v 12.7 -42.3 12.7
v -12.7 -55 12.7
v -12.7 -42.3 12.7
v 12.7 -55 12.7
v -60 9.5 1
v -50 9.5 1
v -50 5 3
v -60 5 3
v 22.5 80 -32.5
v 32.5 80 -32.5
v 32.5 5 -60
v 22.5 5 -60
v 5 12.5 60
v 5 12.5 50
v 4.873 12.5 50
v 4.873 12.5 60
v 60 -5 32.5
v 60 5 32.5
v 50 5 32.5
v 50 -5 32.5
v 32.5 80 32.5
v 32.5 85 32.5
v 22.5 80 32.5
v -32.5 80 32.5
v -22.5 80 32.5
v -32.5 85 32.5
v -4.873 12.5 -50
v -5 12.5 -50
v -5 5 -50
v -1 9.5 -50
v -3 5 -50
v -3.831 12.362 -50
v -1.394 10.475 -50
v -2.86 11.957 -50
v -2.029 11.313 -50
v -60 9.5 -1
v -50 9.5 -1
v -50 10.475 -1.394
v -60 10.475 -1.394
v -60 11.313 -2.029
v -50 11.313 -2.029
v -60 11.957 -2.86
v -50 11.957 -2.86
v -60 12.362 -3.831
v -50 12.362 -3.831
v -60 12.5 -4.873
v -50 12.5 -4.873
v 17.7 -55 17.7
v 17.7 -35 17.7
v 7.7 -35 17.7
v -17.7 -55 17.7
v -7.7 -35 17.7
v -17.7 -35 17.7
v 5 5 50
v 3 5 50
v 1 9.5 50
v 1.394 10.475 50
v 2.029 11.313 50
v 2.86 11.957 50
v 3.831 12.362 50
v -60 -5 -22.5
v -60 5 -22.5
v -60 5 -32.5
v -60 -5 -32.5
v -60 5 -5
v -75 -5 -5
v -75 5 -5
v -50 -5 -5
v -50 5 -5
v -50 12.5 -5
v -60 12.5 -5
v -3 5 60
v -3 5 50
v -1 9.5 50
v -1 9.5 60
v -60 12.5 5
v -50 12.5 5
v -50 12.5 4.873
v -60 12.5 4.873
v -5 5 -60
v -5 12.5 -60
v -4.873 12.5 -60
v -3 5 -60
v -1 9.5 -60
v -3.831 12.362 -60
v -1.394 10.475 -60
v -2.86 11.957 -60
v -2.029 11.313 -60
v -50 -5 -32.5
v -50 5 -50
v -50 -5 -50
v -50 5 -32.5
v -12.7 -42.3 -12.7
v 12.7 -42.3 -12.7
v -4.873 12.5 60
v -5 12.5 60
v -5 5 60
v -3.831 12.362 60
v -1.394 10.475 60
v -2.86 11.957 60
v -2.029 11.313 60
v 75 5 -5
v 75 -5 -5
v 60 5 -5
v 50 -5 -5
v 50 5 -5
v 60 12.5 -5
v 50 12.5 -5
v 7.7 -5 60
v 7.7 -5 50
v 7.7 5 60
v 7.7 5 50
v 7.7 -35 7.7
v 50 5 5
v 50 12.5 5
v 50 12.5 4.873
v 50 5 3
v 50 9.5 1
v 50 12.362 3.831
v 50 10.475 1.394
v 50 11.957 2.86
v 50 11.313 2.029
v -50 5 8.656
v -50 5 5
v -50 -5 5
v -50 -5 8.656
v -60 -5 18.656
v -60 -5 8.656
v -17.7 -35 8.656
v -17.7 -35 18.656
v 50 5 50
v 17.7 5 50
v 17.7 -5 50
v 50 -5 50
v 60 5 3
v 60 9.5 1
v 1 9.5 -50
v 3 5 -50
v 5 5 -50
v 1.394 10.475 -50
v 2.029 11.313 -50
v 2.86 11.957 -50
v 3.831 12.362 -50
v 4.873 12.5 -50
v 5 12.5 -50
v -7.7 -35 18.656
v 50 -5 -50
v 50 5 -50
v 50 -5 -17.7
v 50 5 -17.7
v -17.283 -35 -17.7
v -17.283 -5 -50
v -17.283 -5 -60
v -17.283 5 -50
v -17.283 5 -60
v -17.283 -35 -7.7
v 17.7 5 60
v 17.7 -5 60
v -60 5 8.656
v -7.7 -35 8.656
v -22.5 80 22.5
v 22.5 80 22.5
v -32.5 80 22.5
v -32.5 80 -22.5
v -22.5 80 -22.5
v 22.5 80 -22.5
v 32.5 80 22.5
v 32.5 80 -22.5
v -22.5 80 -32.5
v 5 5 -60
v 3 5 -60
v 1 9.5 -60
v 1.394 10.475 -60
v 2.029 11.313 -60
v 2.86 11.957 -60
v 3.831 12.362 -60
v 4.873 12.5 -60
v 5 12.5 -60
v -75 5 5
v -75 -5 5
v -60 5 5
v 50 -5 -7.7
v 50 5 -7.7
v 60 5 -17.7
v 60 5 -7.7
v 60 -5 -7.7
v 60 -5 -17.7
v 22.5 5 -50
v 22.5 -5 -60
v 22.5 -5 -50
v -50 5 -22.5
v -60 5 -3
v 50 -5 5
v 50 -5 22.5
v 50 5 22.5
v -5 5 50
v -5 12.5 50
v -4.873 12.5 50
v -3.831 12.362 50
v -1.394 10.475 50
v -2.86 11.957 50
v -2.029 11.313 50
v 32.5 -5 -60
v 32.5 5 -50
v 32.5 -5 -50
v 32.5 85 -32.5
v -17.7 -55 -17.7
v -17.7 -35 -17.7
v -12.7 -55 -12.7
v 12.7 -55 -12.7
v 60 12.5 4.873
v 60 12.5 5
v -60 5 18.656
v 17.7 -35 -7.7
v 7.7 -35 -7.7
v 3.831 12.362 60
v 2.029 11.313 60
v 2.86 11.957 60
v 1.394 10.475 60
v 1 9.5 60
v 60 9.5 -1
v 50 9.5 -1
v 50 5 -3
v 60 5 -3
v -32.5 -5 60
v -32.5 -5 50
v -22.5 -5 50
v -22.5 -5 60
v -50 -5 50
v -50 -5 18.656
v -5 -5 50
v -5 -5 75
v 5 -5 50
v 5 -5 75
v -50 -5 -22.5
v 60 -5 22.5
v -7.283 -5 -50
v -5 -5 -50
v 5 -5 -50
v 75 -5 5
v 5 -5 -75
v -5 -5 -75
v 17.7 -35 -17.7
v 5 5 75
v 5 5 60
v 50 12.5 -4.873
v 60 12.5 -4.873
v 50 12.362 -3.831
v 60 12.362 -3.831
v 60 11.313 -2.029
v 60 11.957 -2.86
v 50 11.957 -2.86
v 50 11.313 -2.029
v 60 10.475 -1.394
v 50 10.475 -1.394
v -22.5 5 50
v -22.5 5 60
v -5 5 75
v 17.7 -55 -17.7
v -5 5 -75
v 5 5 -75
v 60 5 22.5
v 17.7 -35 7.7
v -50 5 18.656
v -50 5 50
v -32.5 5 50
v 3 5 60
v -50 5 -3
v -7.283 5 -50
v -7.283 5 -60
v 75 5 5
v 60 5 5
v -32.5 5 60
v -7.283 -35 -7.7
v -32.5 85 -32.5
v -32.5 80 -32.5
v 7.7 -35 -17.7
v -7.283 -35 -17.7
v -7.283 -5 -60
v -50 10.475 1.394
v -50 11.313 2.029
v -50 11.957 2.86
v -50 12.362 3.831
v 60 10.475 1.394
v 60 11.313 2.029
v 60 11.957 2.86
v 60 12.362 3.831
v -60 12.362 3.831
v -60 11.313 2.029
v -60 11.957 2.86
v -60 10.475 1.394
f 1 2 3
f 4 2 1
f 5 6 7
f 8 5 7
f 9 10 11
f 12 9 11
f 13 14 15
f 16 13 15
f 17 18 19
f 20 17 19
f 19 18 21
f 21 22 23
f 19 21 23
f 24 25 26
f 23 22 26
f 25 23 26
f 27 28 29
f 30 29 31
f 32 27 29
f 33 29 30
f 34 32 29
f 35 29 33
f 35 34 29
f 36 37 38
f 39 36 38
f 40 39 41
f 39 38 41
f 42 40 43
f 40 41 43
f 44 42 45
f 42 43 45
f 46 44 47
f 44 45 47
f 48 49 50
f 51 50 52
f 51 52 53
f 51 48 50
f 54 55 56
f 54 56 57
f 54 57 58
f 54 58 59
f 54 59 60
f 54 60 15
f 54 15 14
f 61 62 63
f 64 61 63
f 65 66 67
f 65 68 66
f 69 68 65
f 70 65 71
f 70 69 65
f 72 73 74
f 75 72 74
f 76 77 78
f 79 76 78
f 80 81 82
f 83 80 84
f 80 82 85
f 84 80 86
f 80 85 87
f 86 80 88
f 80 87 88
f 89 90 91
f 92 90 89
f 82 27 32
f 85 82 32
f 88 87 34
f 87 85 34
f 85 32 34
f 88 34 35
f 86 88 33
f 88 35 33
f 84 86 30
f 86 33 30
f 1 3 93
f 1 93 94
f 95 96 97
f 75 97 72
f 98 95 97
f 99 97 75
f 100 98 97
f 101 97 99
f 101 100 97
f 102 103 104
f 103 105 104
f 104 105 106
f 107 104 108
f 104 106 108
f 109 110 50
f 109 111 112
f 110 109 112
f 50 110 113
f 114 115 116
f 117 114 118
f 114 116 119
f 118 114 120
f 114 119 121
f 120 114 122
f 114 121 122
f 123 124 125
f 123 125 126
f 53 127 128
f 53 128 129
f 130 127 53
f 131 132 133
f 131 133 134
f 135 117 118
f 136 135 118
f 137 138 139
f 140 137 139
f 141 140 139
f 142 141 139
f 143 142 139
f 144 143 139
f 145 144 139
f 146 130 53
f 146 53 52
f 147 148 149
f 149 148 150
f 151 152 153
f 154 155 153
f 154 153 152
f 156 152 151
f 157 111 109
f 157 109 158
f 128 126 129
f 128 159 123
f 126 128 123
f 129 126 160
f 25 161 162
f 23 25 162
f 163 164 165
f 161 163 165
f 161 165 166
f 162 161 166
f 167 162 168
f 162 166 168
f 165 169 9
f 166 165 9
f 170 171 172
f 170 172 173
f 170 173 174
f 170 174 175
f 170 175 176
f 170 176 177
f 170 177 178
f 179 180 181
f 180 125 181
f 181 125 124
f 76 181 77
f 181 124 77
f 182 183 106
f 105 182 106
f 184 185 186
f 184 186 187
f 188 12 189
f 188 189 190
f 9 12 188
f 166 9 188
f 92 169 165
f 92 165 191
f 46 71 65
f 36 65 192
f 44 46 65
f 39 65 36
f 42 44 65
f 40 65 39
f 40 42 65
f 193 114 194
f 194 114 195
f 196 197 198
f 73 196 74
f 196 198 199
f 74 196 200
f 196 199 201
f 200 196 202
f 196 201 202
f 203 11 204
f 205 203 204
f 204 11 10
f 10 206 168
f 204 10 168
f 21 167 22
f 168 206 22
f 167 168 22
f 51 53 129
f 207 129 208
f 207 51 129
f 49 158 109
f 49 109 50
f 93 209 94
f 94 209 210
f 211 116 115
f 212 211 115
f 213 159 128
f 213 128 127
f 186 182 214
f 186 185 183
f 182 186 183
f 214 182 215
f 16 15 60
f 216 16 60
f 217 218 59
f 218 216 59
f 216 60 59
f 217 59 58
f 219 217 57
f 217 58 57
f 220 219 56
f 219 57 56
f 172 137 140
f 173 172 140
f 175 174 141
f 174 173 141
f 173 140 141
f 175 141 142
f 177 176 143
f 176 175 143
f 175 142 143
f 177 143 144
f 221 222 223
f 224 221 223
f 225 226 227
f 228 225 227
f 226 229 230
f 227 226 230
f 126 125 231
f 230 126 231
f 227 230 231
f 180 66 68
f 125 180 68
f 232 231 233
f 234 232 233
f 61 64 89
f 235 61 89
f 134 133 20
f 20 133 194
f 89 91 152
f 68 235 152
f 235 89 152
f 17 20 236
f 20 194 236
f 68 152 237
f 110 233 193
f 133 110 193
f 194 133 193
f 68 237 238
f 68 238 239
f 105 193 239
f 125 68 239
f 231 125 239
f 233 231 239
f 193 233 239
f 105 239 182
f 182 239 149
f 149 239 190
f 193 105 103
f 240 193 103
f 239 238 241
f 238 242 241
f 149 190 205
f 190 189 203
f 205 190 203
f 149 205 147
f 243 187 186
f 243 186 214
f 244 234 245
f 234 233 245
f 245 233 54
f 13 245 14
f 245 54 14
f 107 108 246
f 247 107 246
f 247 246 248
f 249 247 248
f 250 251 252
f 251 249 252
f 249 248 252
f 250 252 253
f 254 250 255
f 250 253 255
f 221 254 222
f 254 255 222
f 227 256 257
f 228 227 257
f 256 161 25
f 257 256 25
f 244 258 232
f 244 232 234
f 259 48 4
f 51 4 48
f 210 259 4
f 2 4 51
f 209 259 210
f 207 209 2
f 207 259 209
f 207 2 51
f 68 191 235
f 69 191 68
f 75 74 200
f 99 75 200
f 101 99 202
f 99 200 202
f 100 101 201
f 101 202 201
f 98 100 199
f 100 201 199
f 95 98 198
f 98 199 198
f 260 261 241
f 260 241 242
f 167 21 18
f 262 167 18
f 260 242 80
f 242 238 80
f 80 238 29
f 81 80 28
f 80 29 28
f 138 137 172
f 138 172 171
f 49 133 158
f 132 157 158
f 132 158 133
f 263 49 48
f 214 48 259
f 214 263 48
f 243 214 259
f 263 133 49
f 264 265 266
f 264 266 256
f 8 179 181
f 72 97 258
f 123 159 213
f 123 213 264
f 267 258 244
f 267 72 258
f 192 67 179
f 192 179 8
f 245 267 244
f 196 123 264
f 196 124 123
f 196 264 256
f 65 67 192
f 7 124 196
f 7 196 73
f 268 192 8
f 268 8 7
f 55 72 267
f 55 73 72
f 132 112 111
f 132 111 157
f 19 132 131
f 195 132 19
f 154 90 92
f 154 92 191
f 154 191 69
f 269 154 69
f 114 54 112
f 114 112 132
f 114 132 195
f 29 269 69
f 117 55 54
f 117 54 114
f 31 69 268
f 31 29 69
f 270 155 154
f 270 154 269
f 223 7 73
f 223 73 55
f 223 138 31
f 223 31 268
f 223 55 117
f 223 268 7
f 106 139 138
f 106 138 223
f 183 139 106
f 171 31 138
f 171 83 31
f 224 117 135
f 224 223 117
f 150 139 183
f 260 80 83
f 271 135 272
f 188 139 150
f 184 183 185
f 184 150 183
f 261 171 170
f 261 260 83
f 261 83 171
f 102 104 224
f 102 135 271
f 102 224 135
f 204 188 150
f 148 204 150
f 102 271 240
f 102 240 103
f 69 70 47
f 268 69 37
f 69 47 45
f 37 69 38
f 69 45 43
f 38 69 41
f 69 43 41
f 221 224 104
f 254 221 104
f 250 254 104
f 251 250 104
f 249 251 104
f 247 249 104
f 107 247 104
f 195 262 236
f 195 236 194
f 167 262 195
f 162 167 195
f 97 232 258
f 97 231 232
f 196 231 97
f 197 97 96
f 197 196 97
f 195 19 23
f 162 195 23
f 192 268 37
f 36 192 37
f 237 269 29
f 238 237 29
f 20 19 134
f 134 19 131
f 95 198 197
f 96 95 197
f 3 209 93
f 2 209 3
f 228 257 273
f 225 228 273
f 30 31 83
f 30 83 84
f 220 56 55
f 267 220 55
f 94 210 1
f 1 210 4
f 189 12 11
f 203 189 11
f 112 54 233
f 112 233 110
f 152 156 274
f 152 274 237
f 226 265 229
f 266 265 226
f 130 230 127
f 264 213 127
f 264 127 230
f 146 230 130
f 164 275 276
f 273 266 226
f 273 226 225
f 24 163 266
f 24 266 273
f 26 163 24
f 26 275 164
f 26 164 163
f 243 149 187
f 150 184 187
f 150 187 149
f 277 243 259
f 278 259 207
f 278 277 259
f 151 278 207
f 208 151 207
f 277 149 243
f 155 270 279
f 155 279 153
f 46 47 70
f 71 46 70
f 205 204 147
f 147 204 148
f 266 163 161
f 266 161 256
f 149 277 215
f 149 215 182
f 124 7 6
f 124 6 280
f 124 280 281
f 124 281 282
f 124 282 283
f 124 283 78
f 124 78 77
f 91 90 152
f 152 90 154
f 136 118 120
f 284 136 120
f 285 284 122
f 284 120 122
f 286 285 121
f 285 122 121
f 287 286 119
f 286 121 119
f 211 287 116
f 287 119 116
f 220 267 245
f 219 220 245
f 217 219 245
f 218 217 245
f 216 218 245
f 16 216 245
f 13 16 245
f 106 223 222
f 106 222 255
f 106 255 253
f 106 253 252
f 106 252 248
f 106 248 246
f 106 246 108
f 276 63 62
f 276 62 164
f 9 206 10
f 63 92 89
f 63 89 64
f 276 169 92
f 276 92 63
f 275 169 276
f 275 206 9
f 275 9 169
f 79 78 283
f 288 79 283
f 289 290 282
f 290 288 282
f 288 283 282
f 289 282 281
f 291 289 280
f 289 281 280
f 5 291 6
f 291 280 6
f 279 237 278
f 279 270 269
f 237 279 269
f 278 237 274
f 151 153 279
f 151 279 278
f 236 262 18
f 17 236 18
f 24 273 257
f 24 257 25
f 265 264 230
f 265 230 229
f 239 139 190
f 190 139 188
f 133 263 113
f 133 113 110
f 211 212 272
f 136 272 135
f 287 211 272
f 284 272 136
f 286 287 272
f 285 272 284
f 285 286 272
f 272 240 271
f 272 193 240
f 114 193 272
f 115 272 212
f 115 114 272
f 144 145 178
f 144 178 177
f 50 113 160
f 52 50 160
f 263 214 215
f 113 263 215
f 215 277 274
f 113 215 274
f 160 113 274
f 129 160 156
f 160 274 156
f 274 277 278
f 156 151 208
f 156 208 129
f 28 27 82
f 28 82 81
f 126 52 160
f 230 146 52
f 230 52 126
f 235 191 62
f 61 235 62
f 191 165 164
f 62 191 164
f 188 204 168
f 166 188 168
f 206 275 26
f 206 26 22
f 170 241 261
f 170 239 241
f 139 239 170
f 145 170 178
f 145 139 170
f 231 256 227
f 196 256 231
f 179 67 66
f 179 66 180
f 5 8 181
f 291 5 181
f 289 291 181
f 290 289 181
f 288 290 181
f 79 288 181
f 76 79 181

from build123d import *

# Parameters (mm, degrees)
SKETCH2_W            = 100
SKETCH2_H            = 100
BOSS_EXTRUDE1_DEPTH  = 5
SKETCH3_W            = 100
SKETCH3_H            = 100
BOSS_EXTRUDE2_DEPTH  = 5
SKETCH8_R            = 5
BOSS_EXTRUDE7_DEPTH  = 30
BOSS_EXTRUDE21_DEPTH = 10
FILLET14_R           = 4
FILLET13_R           = 4
SKETCH24_W           = 10
SKETCH24_H           = 10
BOSS_EXTRUDE22_DEPTH = 15
BOSS_EXTRUDE25_DEPTH = 10
SKETCH26_W           = 10
SKETCH26_H           = 10
BOSS_EXTRUDE26_DEPTH = 15
FILLET18_R           = 4
FILLET17_R           = 4
BOSS_EXTRUDE23_DEPTH = 10
SKETCH25_W           = 10
SKETCH25_H           = 10
BOSS_EXTRUDE24_DEPTH = 15
FILLET15_R           = 4
FILLET16_R           = 4
BOSS_EXTRUDE10_DEPTH = 10
FILLET19_R           = 4
SKETCH27_W           = 10
SKETCH27_H           = 10
BOSS_EXTRUDE27_DEPTH = 15
FILLET20_R           = 4
SKETCH33_W           = 65
SKETCH33_H           = 65
BOSS_EXTRUDE29_DEPTH = 5
BOSS_EXTRUDE28_DEPTH = 10
BOSS_EXTRUDE32_DEPTH = 10
BOSS_EXTRUDE34_DEPTH = 10
BOSS_EXTRUDE35_DEPTH = 10
BOSS_EXTRUDE31_DEPTH = 10
BOSS_EXTRUDE33_DEPTH = 10
BOSS_EXTRUDE36_DEPTH = 10
BOSS_EXTRUDE37_DEPTH = 10
SKETCH46_W           = 28.272110448
SKETCH46_H           = 20.427935106
CUT_EXTRUDE1_DEPTH   = 30
SKETCH47_W           = 35.4
SKETCH47_H           = 35.4
BOSS_EXTRUDE38_DEPTH = 20
SKETCH49_W           = 25.4
SKETCH49_H           = 25.4
CUT_EXTRUDE2_DEPTH   = 12.7
SKETCH51_W           = 10
SKETCH51_H           = 10
BOSS_EXTRUDE39_DEPTH = 10
BOSS_EXTRUDE40_DEPTH = 10
SKETCH54_W           = 10
SKETCH54_H           = 10
BOSS_EXTRUDE41_DEPTH = 10
BOSS_EXTRUDE42_DEPTH = 10
SKETCH56_W           = 10
SKETCH56_H           = 10
BOSS_EXTRUDE43_DEPTH = 10
BOSS_EXTRUDE47_DEPTH = 10
SKETCH59_W           = 10
SKETCH59_H           = 10
BOSS_EXTRUDE48_DEPTH = 10
BOSS_EXTRUDE52_DEPTH = 10


with BuildPart() as part:
    # Sketch2 → Boss-Extrude1 (new body)
    with BuildSketch(Plane(origin=(0, 0, 0), x_dir=(1, 0, 0), z_dir=(0, 1, 0))):
        Rectangle(SKETCH2_W, SKETCH2_H)
    extrude(amount=BOSS_EXTRUDE1_DEPTH)

    # Sketch3 → Boss-Extrude2 (add)
    with BuildSketch(Plane.XZ):
        Rectangle(SKETCH3_W, SKETCH3_H)
    extrude(amount=BOSS_EXTRUDE2_DEPTH)

    # Sketch8 → Boss-Extrude7 (add)
    with BuildSketch(Plane.XZ.offset(5)):
        with Locations(Location((0, 0, 0), (0, 0, 90))):
            Circle(SKETCH8_R)
    extrude(amount=BOSS_EXTRUDE7_DEPTH)

    # Sketch11 → Boss-Extrude21 (add)
    with BuildSketch(Plane(origin=(50, 0, 0), x_dir=(0, 0, -1), z_dir=(1, 0, 0))):
        Polygon((5, -5), (5, 12.5), (1, 12.5), (1, 9.5), (3, 5), (-3, 5), (-1, 9.5), (-1, 12.5), (-5, 12.5), (-5, -5), align=None)
    extrude(amount=BOSS_EXTRUDE21_DEPTH)

    # Fillet14
    # the kernel refuses this fillet: 4 mm, written as the material it takes off along each edge
    with BuildSketch(Plane(origin=(40.317541634, 12.5, -1), x_dir=(0, -1, 0), z_dir=(1, 0, 0))) as fillet14_piece_1:
        with BuildLine():
            CenterArc((4, 3.872983346), FILLET14_R, 180, 75.522487814)
            Line((0, 3.872983346), (-0.08, 3.872983346))
            Line((-0.08, 3.872983346), (-0.08, 0))
            Line((-0.08, 0), (0, -0.08))
            ThreePointArc((0, -0.08), (1.5, -0.08), (2.98, -0.077459667))
            Line((2.98, -0.077459667), (3, 0))
        make_face()
    extrude(amount=29.364916731, mode=Mode.SUBTRACT)

    # Fillet13
    # the kernel refuses this fillet: 4 mm, written as the material it takes off along each edge
    with BuildSketch(Plane(origin=(40.317541634, 12.5, 1), x_dir=(0, 0, 1), z_dir=(1, 0, 0))) as fillet13_piece_1:
        with BuildLine():
            CenterArc((3.872983346, 4), FILLET13_R, 194.477512186, 75.522487814)
            Line((0, 3), (-0.077459667, 2.98))
            ThreePointArc((-0.077459667, 2.98), (-0.08, 1.5), (-0.08, 0))
            Line((-0.08, 0), (0, -0.08))
            Line((0, -0.08), (3.872983346, -0.08))
            Line((3.872983346, -0.08), (3.872983346, 0))
        make_face()
    extrude(amount=29.364916731, mode=Mode.SUBTRACT)

    # Sketch24 → Boss-Extrude22 (add)
    with BuildSketch(Plane(origin=(60, 0, 0), x_dir=(0, 0, -1), z_dir=(1, 0, 0))):
        Rectangle(SKETCH24_W, SKETCH24_H)
    extrude(amount=BOSS_EXTRUDE22_DEPTH)

    # Sketch13 → Boss-Extrude25 (add)
    with BuildSketch(Plane.ZY.offset(50)):
        Polygon((-5, 12.5), (-5, -5), (5, -5), (5, 12.5), (1, 12.5), (1, 9.5), (3, 5), (-3, 5), (-1, 9.5), (-1, 12.5), align=None)
    extrude(amount=BOSS_EXTRUDE25_DEPTH)

    # Sketch26 → Boss-Extrude26 (add)
    with BuildSketch(Plane.ZY.offset(60)):
        Rectangle(SKETCH26_W, SKETCH26_H)
    extrude(amount=BOSS_EXTRUDE26_DEPTH)

    # Fillet18
    # the kernel refuses this fillet: 4 mm, written as the material it takes off along each edge
    with BuildSketch(Plane(origin=(-40.317541634, 12.5, 1), x_dir=(0, -1, 0), z_dir=(-1, 0, 0))) as fillet18_piece_1:
        with BuildLine():
            CenterArc((4, 3.872983346), FILLET18_R, 180, 75.522487814)
            Line((0, 3.872983346), (-0.08, 3.872983346))
            Line((-0.08, 3.872983346), (-0.08, 0))
            Line((-0.08, 0), (0, -0.08))
            ThreePointArc((0, -0.08), (1.5, -0.08), (2.98, -0.077459667))
            Line((2.98, -0.077459667), (3, 0))
        make_face()
    extrude(amount=29.364916731, mode=Mode.SUBTRACT)

    # Fillet17
    # the kernel refuses this fillet: 4 mm, written as the material it takes off along each edge
    with BuildSketch(Plane(origin=(-40.317541634, 12.5, -1), x_dir=(0, 0, -1), z_dir=(-1, 0, 0))) as fillet17_piece_1:
        with BuildLine():
            CenterArc((3.872983346, 4), FILLET17_R, 194.477512186, 75.522487814)
            Line((0, 3), (-0.077459667, 2.98))
            ThreePointArc((-0.077459667, 2.98), (-0.08, 1.5), (-0.08, 0))
            Line((-0.08, 0), (0, -0.08))
            Line((0, -0.08), (3.872983346, -0.08))
            Line((3.872983346, -0.08), (3.872983346, 0))
        make_face()
    extrude(amount=29.364916731, mode=Mode.SUBTRACT)

    # Sketch14 → Boss-Extrude23 (add)
    with BuildSketch(Plane(origin=(0, 0, -50), x_dir=(-1, 0, 0), z_dir=(0, 0, -1))):
        Polygon((-5, 12.5), (-1, 12.5), (-1, 9.5), (-3, 5), (3, 5), (1, 9.5), (1, 12.5), (5, 12.5), (5, -5), (-5, -5), align=None)
    extrude(amount=BOSS_EXTRUDE23_DEPTH)

    # Sketch25 → Boss-Extrude24 (add)
    with BuildSketch(Plane(origin=(0, 0, -60), x_dir=(-1, 0, 0), z_dir=(0, 0, -1))):
        Rectangle(SKETCH25_W, SKETCH25_H)
    extrude(amount=BOSS_EXTRUDE24_DEPTH)

    # Fillet15
    # the kernel refuses this fillet: 4 mm, written as the material it takes off along each edge
    with BuildSketch(Plane(origin=(-1, 12.5, -40.317541634), x_dir=(0, -1, 0), z_dir=(0, 0, -1))) as fillet15_piece_1:
        with BuildLine():
            CenterArc((4, 3.872983346), FILLET15_R, 180, 75.522487814)
            Line((0, 3.872983346), (-0.08, 3.872983346))
            Line((-0.08, 3.872983346), (-0.08, 0))
            Line((-0.08, 0), (0, -0.08))
            ThreePointArc((0, -0.08), (1.5, -0.08), (2.98, -0.077459667))
            Line((2.98, -0.077459667), (3, 0))
        make_face()
    extrude(amount=29.364916731, mode=Mode.SUBTRACT)

    # Fillet16
    # the kernel refuses this fillet: 4 mm, written as the material it takes off along each edge
    with BuildSketch(Plane(origin=(1, 12.5, -40.317541634), x_dir=(0, -1, 0), z_dir=(0, 0, -1))) as fillet16_piece_1:
        with BuildLine():
            CenterArc((4, -3.872983346), FILLET16_R, 104.477512186, 75.522487814)
            Line((0, -3.872983346), (-0.08, -3.872983346))
            Line((-0.08, -3.872983346), (-0.08, 0))
            Line((-0.08, 0), (0, 0.08))
            ThreePointArc((0, 0.08), (1.5, 0.08), (2.98, 0.077459667))
            Line((2.98, 0.077459667), (3, 0))
        make_face()
    extrude(amount=29.364916731, mode=Mode.SUBTRACT)

    # Sketch12 → Boss-Extrude10 (add)
    with BuildSketch(Plane.XY.offset(50)):
        Polygon((-5, 12.5), (-5, -5), (5, -5), (5, 12.5), (1, 12.5), (1, 9.5), (3, 5), (-3, 5), (-1, 9.5), (-1, 12.5), align=None)
    extrude(amount=BOSS_EXTRUDE10_DEPTH)

    # Fillet19
    # the kernel refuses this fillet: 4 mm, written as the material it takes off along each edge
    with BuildSketch(Plane(origin=(-1, 12.5, 40.317541634), x_dir=(-1, 0, 0), z_dir=(0, 0, 1))) as fillet19_piece_1:
        with BuildLine():
            CenterArc((3.872983346, 4), FILLET19_R, 194.477512186, 75.522487814)
            Line((0, 3), (-0.077459667, 2.98))
            ThreePointArc((-0.077459667, 2.98), (-0.08, 1.5), (-0.08, 0))
            Line((-0.08, 0), (0, -0.08))
            Line((0, -0.08), (3.872983346, -0.08))
            Line((3.872983346, -0.08), (3.872983346, 0))
        make_face()
    extrude(amount=29.364916731, mode=Mode.SUBTRACT)

    # Sketch27 → Boss-Extrude27 (add)
    with BuildSketch(Plane.XY.offset(60)):
        Rectangle(SKETCH27_W, SKETCH27_H)
    extrude(amount=BOSS_EXTRUDE27_DEPTH)

    # Fillet20
    # the kernel refuses this fillet: 4 mm, written as the material it takes off along each edge
    with BuildSketch(Plane(origin=(1, 12.5, 40.317541634), x_dir=(1, 0, 0), z_dir=(0, 0, 1))) as fillet20_piece_1:
        with BuildLine():
            CenterArc((3.872983346, -4), FILLET20_R, 90, 75.522487814)
            Line((0, -3), (-0.077459667, -2.98))
            ThreePointArc((-0.077459667, -2.98), (-0.08, -1.5), (-0.08, 0))
            Line((-0.08, 0), (0, 0.08))
            Line((0, 0.08), (3.872983346, 0.08))
            Line((3.872983346, 0.08), (3.872983346, 0))
        make_face()
    extrude(amount=29.364916731, mode=Mode.SUBTRACT)

    # Sketch30 → Boss-Extrude28 (add)
    with BuildSketch(Plane.ZY.offset(50)):
        Polygon((-27.5, 5), (-22.5, 5), (-22.5, -5), (-32.5, -5), (-32.5, 5), align=None)
    extrude(amount=BOSS_EXTRUDE28_DEPTH)



with BuildPart() as body_2:
    # Sketch33 → Boss-Extrude29 (new body)
    with BuildSketch(Plane(origin=(0, 85, 0), x_dir=(1, 0, 0), z_dir=(0, 1, 0))):
        Rectangle(SKETCH33_W, SKETCH33_H)
    extrude(amount=-BOSS_EXTRUDE29_DEPTH)


with BuildPart() as part_1:
    add(part.part)

    add(body_2.part)  # Boss-Extrude32 merges body 2
    # Sketch40 → Boss-Extrude32 (add)
    with BuildSketch(Plane(origin=(0, 0, -32.5), x_dir=(-1, 0, 0), z_dir=(0, 0, -1))):
        Polygon((60, 5), (32.5, 80), (22.5, 80), (50, 5), align=None)
    extrude(amount=-BOSS_EXTRUDE32_DEPTH)

    # Sketch42 → Boss-Extrude34 (add)
    with BuildSketch(Plane(origin=(50, 0, 0), x_dir=(0, 0, -1), z_dir=(1, 0, 0))):
        Polygon((-27.5, 5), (-22.5, 5), (-22.5, -5), (-32.5, -5), (-32.5, 5), align=None)
    extrude(amount=BOSS_EXTRUDE34_DEPTH)

    # Sketch43 → Boss-Extrude35 (add)
    with BuildSketch(Plane.XY.offset(32.5)):
        Polygon((32.5, 80), (60, 5), (50, 5), (22.5, 80), align=None)
    extrude(amount=-BOSS_EXTRUDE35_DEPTH)

    # Sketch37 → Boss-Extrude31 (add)
    with BuildSketch(Plane.XY.offset(50)):
        Polygon((-27.5, 5), (-22.5, 5), (-22.5, -5), (-32.5, -5), (-32.5, 5), align=None)
    extrude(amount=BOSS_EXTRUDE31_DEPTH)

    # Sketch41 → Boss-Extrude33 (add)
    with BuildSketch(Plane.ZY.offset(32.5)):
        Polygon((60, 5), (32.5, 80), (22.5, 80), (50, 5), align=None)
    extrude(amount=-BOSS_EXTRUDE33_DEPTH)

    # Sketch44 → Boss-Extrude36 (add)
    with BuildSketch(Plane(origin=(0, 0, -50), x_dir=(-1, 0, 0), z_dir=(0, 0, -1))):
        Polygon((-27.5, 5), (-22.5, 5), (-22.5, -5), (-32.5, -5), (-32.5, 5), align=None)
    extrude(amount=BOSS_EXTRUDE36_DEPTH)

    # Sketch45 → Boss-Extrude37 (add)
    with BuildSketch(Plane(origin=(32.5, 0, 0), x_dir=(0, 0, -1), z_dir=(1, 0, 0))):
        Polygon((32.5, 80), (60, 5), (50, 5), (22.5, 80), align=None)
    extrude(amount=-BOSS_EXTRUDE37_DEPTH)

    # Sketch46 → Cut-Extrude1 (cut)
    with BuildSketch(Plane.XZ.offset(5)):
        Rectangle(SKETCH46_W, SKETCH46_H)
    extrude(amount=CUT_EXTRUDE1_DEPTH, mode=Mode.SUBTRACT)

    # Sketch51 → Boss-Extrude39 (add)
    with BuildSketch(Plane.XY.offset(50)):
        with Locations((12.7, 0)):
            Rectangle(SKETCH51_W, SKETCH51_H)
    extrude(amount=BOSS_EXTRUDE39_DEPTH)



with BuildPart() as body_2_2:
    # Sketch47 → Boss-Extrude38 (new body)
    with BuildSketch(Plane(origin=(0, -55, 0), x_dir=(-1, 0, 0), z_dir=(0, -1, 0))):
        Rectangle(SKETCH47_W, SKETCH47_H)
    extrude(amount=-BOSS_EXTRUDE38_DEPTH)

    # Sketch49 → Cut-Extrude2 (cut)
    with BuildSketch(Plane.XZ.offset(55)):
        Rectangle(SKETCH49_W, SKETCH49_H)
    extrude(amount=-CUT_EXTRUDE2_DEPTH, mode=Mode.SUBTRACT)


with BuildPart() as part_2:
    add(part_1.part)

    add(body_2_2.part)  # Boss-Extrude40 merges body 2 2
    # Sketch52 → Boss-Extrude40 (add)
    with BuildSketch(Plane(origin=(17.7, 0, 0), x_dir=(0, 0, -1), z_dir=(1, 0, 0))):
        Polygon((-60, -5), (-17.7, -35), (-7.7, -35), (-50, -5), align=None)
    extrude(amount=-BOSS_EXTRUDE40_DEPTH)

    # Sketch54 → Boss-Extrude41 (add)
    with BuildSketch(Plane(origin=(50, 0, 0), x_dir=(0, 0, -1), z_dir=(1, 0, 0))):
        with Locations((12.7, 0)):
            Rectangle(SKETCH54_W, SKETCH54_H)
    extrude(amount=BOSS_EXTRUDE41_DEPTH)

    # Sketch55 → Boss-Extrude42 (add)
    with BuildSketch(Plane(origin=(0, 0, -17.7), x_dir=(-1, 0, 0), z_dir=(0, 0, -1))):
        Polygon((-60, -5), (-17.7, -35), (-7.7, -35), (-50, -5), align=None)
    extrude(amount=-BOSS_EXTRUDE42_DEPTH)

    # Sketch56 → Boss-Extrude43 (add)
    with BuildSketch(Plane(origin=(0, 0, -50), x_dir=(-1, 0, 0), z_dir=(0, 0, -1))):
        with Locations((12.28306994, 0)):
            Rectangle(SKETCH56_W, SKETCH56_H)
    extrude(amount=BOSS_EXTRUDE43_DEPTH)

    # Sketch58 → Boss-Extrude47 (add)
    with BuildSketch(Plane.ZY.offset(17.28306994)):
        Polygon((-60, -5), (-17.7, -35), (-7.7, -35), (-50, -5), align=None)
    extrude(amount=-BOSS_EXTRUDE47_DEPTH)

    # Sketch59 → Boss-Extrude48 (add)
    with BuildSketch(Plane.ZY.offset(50)):
        with Locations((13.655595041, 0)):
            Rectangle(SKETCH59_W, SKETCH59_H)
    extrude(amount=BOSS_EXTRUDE48_DEPTH)

    # Sketch61 → Boss-Extrude52 (add)
    with BuildSketch(Plane.XY.offset(18.655595041)):
        Polygon((-60, -5), (-17.7, -35), (-7.7, -35), (-50, -5), align=None)
    extrude(amount=-BOSS_EXTRUDE52_DEPTH)


solid = part_2.part
